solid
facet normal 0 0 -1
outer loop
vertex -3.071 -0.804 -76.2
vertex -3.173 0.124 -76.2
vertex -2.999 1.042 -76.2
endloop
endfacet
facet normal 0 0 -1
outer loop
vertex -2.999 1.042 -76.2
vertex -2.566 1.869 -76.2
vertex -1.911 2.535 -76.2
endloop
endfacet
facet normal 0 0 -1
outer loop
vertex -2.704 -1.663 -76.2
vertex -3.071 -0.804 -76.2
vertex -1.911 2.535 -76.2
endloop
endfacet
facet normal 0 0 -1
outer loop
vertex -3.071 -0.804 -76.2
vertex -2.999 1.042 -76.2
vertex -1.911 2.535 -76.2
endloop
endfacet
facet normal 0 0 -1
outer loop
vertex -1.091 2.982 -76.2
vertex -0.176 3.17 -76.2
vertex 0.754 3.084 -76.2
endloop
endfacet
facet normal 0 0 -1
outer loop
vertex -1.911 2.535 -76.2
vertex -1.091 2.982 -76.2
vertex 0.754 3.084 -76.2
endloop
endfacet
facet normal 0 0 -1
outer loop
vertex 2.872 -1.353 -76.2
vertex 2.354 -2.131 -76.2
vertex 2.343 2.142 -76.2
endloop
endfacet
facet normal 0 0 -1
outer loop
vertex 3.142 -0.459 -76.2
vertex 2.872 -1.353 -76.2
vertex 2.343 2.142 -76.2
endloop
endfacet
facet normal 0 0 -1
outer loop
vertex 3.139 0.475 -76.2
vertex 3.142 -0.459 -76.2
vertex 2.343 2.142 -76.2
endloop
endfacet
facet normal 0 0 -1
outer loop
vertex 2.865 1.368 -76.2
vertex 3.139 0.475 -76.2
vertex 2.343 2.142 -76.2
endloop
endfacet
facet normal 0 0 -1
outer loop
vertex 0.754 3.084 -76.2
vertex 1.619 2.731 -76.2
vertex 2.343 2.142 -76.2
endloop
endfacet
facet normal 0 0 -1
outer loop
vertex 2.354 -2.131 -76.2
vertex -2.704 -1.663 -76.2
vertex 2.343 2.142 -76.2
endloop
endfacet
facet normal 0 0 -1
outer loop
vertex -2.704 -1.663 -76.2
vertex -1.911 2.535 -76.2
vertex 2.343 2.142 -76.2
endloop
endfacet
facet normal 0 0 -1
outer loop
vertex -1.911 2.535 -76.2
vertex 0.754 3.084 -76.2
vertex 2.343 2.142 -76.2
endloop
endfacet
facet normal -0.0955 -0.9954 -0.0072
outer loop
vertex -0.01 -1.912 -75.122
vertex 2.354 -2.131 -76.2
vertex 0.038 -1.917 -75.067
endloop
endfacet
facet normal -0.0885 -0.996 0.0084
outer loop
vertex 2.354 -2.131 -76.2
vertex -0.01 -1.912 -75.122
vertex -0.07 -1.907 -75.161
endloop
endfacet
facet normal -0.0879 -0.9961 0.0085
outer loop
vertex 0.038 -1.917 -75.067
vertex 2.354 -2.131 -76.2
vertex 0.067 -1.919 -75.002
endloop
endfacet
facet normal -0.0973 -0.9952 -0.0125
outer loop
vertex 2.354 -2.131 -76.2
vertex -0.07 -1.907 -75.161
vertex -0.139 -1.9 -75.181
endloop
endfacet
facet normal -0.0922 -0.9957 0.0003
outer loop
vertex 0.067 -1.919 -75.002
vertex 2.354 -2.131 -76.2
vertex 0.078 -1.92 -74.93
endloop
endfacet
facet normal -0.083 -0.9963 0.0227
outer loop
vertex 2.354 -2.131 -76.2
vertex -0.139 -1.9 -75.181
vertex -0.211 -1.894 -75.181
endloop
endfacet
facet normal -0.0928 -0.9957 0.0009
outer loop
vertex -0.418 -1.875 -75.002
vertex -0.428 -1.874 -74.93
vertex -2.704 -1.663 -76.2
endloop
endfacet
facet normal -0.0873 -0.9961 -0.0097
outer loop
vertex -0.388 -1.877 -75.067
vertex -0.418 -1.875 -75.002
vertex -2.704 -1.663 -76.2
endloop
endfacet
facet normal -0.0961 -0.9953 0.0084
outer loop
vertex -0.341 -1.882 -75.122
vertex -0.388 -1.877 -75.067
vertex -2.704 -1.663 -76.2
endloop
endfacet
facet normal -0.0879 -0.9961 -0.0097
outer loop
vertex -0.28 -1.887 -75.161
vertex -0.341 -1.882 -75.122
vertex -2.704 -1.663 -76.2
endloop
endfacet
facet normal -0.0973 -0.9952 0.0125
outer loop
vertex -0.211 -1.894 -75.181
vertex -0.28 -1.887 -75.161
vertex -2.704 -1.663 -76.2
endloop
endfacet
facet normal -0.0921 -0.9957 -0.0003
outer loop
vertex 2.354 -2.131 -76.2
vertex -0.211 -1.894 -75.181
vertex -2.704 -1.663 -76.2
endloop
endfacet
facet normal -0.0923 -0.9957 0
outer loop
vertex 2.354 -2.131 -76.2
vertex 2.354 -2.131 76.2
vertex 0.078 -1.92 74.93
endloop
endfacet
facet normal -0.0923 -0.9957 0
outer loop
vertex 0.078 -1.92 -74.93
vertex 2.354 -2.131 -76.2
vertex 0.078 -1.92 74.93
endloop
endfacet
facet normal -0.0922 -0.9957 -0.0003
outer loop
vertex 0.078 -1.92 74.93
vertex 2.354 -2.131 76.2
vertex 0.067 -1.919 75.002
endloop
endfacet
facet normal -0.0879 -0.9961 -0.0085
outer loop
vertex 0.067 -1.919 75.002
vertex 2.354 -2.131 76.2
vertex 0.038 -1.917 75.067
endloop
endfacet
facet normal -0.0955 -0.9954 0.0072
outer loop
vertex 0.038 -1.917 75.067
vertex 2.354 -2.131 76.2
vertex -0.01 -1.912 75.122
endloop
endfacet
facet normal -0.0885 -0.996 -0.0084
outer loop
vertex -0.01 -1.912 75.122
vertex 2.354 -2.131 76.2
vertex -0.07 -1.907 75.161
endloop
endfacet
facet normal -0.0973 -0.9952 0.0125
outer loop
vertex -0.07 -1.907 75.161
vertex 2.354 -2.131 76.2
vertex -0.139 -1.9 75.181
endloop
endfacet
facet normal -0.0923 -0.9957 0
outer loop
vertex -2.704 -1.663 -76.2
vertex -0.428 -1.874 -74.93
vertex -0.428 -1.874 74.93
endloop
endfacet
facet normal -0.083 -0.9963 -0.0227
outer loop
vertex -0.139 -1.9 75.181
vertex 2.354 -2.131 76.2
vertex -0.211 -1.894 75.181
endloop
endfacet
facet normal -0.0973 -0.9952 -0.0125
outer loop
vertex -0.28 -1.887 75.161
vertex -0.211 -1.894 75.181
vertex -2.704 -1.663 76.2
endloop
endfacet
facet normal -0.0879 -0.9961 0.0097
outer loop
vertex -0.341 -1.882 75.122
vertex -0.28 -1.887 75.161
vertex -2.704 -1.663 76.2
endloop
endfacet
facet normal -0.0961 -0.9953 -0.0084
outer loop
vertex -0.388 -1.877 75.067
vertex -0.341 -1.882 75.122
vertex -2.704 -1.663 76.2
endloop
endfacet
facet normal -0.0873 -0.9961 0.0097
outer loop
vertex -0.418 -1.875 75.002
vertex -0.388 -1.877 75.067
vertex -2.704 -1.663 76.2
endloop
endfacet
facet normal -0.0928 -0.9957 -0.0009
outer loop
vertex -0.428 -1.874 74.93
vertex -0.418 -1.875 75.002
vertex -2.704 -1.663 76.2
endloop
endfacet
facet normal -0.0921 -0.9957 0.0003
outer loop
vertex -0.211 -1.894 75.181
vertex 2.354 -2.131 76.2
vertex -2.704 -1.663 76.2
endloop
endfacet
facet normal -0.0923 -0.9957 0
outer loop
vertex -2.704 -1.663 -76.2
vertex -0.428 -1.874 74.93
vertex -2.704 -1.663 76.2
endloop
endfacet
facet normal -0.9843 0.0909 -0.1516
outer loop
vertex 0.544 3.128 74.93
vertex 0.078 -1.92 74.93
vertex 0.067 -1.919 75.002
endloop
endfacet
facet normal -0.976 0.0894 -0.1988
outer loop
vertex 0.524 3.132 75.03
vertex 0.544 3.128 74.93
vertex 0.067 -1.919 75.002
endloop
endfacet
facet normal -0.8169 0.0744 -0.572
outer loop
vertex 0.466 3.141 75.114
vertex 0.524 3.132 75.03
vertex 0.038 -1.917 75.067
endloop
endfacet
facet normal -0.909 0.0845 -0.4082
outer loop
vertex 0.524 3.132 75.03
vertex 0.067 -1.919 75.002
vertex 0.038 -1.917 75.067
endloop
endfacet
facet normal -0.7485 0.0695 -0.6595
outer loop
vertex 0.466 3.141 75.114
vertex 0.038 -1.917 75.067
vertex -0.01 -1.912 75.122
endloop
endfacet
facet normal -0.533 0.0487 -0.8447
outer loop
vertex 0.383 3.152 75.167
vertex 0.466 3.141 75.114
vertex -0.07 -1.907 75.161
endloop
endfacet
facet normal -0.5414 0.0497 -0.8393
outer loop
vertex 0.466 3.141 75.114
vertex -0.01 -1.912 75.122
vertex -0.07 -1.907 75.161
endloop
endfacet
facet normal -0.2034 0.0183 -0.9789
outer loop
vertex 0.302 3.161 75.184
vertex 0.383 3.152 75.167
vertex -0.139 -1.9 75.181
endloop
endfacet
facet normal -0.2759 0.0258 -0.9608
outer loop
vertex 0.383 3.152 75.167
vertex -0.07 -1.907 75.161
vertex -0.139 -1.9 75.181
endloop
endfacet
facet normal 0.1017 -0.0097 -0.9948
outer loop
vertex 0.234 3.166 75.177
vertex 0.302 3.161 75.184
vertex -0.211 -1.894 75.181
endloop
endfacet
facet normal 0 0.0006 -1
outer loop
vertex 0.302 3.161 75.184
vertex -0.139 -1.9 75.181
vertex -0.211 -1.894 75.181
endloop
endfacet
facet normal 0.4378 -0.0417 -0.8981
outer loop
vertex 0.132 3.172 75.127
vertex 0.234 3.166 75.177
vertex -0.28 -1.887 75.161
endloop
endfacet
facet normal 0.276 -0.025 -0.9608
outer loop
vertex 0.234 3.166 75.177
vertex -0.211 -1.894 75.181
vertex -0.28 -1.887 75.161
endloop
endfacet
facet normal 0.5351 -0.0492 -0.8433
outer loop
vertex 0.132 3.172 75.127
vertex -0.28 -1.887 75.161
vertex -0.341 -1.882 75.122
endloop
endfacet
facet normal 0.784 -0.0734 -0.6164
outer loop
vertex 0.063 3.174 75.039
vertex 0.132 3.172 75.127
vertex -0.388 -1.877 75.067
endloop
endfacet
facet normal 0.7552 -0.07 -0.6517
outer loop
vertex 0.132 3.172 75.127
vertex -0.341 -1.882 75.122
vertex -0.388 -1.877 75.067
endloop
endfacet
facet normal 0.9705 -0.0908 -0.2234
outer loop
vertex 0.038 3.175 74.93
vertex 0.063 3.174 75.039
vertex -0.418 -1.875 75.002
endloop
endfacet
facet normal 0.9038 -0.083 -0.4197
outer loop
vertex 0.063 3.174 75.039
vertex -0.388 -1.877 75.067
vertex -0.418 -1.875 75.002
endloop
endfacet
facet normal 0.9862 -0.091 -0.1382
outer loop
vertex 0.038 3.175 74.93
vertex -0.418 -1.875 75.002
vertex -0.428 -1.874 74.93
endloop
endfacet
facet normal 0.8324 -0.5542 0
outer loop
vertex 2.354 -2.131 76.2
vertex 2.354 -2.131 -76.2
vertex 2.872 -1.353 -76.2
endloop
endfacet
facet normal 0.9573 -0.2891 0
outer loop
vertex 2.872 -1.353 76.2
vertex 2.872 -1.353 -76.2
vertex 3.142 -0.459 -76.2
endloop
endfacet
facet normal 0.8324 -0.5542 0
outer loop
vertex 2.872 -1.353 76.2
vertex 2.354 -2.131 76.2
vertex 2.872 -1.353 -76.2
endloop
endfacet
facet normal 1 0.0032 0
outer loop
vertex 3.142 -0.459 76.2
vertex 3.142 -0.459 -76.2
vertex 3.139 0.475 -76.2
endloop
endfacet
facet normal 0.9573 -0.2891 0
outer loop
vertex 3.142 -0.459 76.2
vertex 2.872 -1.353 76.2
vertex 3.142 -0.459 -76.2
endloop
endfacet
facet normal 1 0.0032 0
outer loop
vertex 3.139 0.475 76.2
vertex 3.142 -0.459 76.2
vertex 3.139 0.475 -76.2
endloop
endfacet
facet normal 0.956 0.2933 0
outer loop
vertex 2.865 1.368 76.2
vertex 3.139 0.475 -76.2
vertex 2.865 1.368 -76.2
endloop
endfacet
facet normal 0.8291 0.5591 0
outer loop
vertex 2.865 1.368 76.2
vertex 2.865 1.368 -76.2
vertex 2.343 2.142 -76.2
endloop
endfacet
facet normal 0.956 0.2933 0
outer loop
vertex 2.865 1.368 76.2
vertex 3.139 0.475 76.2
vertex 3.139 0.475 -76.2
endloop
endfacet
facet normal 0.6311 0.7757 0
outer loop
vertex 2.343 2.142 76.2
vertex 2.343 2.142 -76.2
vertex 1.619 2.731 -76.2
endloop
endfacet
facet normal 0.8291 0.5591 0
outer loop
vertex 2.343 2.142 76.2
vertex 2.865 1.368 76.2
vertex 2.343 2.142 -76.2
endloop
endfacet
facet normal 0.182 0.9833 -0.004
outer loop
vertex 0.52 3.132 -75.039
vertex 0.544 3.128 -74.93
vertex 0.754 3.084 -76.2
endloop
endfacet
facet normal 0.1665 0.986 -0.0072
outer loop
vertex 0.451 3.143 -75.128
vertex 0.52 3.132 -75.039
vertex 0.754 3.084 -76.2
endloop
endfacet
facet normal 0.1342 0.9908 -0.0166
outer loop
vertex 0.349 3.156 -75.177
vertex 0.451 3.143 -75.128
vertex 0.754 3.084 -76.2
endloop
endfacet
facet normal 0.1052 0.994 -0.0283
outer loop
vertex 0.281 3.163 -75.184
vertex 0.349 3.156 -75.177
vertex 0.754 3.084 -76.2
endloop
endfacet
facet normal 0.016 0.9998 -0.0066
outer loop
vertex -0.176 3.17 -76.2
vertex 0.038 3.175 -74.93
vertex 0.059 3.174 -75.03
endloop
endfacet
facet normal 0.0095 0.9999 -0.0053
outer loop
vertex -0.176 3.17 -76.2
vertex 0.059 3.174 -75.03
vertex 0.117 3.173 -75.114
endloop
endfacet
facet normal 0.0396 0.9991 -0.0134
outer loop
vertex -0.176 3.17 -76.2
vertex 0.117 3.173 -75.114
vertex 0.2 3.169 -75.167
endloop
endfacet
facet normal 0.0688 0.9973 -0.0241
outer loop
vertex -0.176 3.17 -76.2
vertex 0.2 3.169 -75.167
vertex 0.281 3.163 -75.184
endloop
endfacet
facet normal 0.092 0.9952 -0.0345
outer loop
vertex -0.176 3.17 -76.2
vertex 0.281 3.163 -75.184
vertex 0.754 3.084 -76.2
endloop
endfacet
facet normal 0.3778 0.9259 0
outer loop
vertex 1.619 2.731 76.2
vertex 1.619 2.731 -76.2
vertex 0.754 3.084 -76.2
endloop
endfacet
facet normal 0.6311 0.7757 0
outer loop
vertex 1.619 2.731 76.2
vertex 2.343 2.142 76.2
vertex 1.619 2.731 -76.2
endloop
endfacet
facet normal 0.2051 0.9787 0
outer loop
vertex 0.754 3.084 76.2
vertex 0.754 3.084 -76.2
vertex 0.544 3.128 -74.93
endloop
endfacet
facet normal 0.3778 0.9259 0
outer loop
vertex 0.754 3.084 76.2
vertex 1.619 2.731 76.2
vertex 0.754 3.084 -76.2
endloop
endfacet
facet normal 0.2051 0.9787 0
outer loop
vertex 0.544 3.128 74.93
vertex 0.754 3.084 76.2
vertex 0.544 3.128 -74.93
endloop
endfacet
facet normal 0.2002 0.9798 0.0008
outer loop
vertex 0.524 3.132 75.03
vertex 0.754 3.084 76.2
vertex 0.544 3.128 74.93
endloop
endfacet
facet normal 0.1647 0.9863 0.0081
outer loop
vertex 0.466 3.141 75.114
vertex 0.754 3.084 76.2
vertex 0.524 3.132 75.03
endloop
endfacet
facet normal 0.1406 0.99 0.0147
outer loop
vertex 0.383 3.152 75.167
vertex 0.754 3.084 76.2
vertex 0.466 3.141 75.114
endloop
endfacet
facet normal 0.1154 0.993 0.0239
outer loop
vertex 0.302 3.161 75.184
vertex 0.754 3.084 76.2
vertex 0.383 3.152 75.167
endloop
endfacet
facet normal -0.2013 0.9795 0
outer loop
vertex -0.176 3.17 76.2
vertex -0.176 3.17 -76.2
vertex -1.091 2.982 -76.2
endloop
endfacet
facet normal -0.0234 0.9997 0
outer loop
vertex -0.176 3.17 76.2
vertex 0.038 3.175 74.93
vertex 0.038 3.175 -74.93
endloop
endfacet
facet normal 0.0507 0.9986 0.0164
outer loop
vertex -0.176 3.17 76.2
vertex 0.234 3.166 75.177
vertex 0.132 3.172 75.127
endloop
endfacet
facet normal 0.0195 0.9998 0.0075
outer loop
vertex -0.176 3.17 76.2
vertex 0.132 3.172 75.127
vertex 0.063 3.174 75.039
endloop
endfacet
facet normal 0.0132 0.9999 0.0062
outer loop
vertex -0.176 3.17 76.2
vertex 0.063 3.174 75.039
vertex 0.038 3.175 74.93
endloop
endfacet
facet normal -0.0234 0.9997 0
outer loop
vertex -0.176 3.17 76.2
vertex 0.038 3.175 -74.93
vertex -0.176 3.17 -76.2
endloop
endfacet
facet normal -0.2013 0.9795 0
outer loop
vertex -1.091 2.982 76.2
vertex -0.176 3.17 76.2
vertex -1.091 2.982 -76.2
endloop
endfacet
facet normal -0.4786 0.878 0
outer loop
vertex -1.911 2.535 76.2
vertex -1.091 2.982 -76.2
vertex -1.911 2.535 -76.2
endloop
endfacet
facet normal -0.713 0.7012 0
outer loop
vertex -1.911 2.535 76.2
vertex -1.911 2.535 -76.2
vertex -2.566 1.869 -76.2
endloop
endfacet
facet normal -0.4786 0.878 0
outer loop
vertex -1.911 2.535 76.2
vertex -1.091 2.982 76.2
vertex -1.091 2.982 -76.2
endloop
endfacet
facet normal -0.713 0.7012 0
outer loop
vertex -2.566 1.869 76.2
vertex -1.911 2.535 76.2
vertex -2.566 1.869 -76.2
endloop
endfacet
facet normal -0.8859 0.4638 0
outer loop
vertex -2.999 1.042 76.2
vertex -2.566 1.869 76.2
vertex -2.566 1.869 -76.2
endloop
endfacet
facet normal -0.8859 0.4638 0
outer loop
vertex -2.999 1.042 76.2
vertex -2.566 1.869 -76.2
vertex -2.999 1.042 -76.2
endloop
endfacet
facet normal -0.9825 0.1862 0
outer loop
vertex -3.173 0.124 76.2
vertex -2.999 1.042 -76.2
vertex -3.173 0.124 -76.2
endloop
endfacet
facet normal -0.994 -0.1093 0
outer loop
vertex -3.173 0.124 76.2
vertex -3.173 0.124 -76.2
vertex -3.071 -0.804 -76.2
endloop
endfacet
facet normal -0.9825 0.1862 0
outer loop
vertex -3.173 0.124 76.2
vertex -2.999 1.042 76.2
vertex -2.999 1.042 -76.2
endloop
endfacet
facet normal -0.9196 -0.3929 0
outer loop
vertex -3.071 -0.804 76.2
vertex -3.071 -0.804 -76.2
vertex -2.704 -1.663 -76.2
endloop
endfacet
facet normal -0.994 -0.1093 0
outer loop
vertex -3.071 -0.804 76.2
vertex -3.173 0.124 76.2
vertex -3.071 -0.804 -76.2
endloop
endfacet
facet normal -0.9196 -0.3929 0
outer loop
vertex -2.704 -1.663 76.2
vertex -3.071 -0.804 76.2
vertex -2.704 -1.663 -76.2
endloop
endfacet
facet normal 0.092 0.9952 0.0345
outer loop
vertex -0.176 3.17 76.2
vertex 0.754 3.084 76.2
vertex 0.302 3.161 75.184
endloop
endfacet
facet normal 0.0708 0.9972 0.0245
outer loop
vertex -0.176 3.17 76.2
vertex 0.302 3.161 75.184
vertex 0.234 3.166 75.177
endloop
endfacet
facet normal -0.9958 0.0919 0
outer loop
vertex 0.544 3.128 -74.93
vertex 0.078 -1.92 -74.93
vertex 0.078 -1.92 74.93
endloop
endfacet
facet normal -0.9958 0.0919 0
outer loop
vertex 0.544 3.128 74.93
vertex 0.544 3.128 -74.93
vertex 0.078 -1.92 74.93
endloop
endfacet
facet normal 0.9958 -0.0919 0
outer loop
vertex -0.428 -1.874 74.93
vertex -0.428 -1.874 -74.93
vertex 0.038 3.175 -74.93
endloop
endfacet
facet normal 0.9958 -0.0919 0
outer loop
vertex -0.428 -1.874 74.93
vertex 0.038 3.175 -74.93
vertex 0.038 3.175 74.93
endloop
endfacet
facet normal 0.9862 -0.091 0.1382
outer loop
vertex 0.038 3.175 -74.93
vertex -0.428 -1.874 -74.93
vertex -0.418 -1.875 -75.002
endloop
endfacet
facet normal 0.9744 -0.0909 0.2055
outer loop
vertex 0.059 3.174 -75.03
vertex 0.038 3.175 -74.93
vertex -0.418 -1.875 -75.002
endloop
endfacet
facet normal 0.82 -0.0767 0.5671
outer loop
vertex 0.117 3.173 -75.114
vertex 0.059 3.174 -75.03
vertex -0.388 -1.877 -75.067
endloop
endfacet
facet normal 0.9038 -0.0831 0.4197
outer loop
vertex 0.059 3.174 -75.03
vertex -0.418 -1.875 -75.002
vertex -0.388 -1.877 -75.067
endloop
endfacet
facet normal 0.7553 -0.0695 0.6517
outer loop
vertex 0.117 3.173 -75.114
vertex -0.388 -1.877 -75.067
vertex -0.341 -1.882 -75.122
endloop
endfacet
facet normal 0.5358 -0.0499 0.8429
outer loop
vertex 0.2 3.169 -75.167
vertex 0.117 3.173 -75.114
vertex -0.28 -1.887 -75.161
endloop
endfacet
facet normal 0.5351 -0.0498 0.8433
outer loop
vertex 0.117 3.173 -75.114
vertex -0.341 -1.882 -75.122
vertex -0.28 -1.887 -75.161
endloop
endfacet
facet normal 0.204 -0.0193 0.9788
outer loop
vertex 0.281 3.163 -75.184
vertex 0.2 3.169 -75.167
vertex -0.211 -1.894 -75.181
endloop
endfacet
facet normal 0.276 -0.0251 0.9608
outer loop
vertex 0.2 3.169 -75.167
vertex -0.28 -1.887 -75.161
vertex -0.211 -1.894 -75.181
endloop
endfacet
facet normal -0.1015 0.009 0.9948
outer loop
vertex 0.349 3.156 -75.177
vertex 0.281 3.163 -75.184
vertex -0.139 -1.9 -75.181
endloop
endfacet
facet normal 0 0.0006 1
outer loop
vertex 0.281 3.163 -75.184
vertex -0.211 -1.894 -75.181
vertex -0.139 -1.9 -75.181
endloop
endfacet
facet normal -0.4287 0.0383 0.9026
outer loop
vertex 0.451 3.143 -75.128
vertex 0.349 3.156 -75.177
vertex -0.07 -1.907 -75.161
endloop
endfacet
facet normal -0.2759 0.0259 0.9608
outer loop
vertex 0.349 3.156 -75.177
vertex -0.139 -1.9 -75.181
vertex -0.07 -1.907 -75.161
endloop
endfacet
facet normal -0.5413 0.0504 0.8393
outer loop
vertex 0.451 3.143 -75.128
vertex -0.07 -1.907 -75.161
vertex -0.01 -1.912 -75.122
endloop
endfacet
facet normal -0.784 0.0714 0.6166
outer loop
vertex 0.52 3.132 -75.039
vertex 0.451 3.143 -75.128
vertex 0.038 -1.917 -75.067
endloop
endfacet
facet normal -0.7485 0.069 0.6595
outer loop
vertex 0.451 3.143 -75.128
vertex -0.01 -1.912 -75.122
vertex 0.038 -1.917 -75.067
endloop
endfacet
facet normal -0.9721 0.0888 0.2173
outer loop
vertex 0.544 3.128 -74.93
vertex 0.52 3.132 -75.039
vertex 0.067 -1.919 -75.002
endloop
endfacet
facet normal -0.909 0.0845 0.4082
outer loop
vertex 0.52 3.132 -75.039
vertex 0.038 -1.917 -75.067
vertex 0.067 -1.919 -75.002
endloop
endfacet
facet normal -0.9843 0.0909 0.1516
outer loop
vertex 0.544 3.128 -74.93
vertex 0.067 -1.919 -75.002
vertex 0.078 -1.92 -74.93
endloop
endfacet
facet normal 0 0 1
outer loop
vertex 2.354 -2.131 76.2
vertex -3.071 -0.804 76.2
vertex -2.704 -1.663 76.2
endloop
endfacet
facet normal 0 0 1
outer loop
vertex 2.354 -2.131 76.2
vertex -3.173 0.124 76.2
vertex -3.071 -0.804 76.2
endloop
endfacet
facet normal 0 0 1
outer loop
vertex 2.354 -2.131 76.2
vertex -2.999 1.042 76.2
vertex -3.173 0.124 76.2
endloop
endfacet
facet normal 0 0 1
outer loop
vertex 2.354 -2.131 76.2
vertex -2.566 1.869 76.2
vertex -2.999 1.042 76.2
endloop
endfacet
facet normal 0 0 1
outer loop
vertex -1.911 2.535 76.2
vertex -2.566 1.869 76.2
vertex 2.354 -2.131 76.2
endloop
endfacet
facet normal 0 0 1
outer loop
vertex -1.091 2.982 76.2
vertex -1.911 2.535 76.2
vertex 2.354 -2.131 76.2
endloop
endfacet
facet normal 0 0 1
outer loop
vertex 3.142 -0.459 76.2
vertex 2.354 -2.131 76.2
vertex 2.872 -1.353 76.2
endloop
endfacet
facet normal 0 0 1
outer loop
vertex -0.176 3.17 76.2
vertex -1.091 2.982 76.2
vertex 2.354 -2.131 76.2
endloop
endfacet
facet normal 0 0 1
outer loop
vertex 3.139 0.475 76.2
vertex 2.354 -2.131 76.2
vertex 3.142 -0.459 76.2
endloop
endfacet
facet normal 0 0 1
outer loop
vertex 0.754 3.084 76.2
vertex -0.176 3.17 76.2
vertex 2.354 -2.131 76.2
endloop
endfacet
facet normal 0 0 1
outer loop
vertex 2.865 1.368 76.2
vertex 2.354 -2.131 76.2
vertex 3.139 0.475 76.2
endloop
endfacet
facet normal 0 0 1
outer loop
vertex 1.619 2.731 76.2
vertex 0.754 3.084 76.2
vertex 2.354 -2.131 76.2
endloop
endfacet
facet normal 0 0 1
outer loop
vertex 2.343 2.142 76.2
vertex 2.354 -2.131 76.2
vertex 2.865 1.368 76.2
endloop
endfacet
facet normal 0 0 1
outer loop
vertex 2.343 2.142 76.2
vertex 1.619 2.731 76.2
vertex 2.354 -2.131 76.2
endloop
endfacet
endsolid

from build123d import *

# Parameters (mm, degrees)
F0_R     = 3.175
F1_DEPTH = 76.2
F3_DEPTH = 152.4
F4_W     = 0.508
F4_H     = 149.86
F5_DEPTH = 25.4


with BuildPart() as f1:
    # F0 (on Top) → F1 (new body, symmetric)
    with BuildSketch(Plane.XY):
        Circle(F0_R)
    extrude(amount=F1_DEPTH, both=True)

    # F2 (on face) → F3 (cut)
    with BuildSketch(Plane.XY.offset(76.2)):
        with BuildLine():
            Line((2.3540518227, -2.1305081591), (-2.7044223431, -1.6633474653))
            ThreePointArc((-2.7044223431, -1.6633474653), (-0.2919754336, -3.1615463536), (2.3540518227, -2.1305081591))
        make_face()
    extrude(amount=-F3_DEPTH, mode=Mode.SUBTRACT)

    # F4 (on face) → F5 (cut)
    with BuildSketch(Plane(origin=(-0.1751852602, -1.8969278122, 0), x_dir=(0.9957626311, -0.0919607665, 0), z_dir=(-0.0919607665, -0.9957626311, 0))):
        Rectangle(F4_W, F4_H)
        with BuildLine():
            Line((0.254, -74.93), (-0.254, -74.93))
            ThreePointArc((-0.254, -74.93), (0, -75.184), (0.254, -74.93))
        make_face()
        with BuildLine():
            ThreePointArc((0.254, 74.93), (0, 75.184), (-0.254, 74.93))
            Line((-0.254, 74.93), (0.254, 74.93))
        make_face()
    extrude(amount=-F5_DEPTH, mode=Mode.SUBTRACT)


solid = f1.part
